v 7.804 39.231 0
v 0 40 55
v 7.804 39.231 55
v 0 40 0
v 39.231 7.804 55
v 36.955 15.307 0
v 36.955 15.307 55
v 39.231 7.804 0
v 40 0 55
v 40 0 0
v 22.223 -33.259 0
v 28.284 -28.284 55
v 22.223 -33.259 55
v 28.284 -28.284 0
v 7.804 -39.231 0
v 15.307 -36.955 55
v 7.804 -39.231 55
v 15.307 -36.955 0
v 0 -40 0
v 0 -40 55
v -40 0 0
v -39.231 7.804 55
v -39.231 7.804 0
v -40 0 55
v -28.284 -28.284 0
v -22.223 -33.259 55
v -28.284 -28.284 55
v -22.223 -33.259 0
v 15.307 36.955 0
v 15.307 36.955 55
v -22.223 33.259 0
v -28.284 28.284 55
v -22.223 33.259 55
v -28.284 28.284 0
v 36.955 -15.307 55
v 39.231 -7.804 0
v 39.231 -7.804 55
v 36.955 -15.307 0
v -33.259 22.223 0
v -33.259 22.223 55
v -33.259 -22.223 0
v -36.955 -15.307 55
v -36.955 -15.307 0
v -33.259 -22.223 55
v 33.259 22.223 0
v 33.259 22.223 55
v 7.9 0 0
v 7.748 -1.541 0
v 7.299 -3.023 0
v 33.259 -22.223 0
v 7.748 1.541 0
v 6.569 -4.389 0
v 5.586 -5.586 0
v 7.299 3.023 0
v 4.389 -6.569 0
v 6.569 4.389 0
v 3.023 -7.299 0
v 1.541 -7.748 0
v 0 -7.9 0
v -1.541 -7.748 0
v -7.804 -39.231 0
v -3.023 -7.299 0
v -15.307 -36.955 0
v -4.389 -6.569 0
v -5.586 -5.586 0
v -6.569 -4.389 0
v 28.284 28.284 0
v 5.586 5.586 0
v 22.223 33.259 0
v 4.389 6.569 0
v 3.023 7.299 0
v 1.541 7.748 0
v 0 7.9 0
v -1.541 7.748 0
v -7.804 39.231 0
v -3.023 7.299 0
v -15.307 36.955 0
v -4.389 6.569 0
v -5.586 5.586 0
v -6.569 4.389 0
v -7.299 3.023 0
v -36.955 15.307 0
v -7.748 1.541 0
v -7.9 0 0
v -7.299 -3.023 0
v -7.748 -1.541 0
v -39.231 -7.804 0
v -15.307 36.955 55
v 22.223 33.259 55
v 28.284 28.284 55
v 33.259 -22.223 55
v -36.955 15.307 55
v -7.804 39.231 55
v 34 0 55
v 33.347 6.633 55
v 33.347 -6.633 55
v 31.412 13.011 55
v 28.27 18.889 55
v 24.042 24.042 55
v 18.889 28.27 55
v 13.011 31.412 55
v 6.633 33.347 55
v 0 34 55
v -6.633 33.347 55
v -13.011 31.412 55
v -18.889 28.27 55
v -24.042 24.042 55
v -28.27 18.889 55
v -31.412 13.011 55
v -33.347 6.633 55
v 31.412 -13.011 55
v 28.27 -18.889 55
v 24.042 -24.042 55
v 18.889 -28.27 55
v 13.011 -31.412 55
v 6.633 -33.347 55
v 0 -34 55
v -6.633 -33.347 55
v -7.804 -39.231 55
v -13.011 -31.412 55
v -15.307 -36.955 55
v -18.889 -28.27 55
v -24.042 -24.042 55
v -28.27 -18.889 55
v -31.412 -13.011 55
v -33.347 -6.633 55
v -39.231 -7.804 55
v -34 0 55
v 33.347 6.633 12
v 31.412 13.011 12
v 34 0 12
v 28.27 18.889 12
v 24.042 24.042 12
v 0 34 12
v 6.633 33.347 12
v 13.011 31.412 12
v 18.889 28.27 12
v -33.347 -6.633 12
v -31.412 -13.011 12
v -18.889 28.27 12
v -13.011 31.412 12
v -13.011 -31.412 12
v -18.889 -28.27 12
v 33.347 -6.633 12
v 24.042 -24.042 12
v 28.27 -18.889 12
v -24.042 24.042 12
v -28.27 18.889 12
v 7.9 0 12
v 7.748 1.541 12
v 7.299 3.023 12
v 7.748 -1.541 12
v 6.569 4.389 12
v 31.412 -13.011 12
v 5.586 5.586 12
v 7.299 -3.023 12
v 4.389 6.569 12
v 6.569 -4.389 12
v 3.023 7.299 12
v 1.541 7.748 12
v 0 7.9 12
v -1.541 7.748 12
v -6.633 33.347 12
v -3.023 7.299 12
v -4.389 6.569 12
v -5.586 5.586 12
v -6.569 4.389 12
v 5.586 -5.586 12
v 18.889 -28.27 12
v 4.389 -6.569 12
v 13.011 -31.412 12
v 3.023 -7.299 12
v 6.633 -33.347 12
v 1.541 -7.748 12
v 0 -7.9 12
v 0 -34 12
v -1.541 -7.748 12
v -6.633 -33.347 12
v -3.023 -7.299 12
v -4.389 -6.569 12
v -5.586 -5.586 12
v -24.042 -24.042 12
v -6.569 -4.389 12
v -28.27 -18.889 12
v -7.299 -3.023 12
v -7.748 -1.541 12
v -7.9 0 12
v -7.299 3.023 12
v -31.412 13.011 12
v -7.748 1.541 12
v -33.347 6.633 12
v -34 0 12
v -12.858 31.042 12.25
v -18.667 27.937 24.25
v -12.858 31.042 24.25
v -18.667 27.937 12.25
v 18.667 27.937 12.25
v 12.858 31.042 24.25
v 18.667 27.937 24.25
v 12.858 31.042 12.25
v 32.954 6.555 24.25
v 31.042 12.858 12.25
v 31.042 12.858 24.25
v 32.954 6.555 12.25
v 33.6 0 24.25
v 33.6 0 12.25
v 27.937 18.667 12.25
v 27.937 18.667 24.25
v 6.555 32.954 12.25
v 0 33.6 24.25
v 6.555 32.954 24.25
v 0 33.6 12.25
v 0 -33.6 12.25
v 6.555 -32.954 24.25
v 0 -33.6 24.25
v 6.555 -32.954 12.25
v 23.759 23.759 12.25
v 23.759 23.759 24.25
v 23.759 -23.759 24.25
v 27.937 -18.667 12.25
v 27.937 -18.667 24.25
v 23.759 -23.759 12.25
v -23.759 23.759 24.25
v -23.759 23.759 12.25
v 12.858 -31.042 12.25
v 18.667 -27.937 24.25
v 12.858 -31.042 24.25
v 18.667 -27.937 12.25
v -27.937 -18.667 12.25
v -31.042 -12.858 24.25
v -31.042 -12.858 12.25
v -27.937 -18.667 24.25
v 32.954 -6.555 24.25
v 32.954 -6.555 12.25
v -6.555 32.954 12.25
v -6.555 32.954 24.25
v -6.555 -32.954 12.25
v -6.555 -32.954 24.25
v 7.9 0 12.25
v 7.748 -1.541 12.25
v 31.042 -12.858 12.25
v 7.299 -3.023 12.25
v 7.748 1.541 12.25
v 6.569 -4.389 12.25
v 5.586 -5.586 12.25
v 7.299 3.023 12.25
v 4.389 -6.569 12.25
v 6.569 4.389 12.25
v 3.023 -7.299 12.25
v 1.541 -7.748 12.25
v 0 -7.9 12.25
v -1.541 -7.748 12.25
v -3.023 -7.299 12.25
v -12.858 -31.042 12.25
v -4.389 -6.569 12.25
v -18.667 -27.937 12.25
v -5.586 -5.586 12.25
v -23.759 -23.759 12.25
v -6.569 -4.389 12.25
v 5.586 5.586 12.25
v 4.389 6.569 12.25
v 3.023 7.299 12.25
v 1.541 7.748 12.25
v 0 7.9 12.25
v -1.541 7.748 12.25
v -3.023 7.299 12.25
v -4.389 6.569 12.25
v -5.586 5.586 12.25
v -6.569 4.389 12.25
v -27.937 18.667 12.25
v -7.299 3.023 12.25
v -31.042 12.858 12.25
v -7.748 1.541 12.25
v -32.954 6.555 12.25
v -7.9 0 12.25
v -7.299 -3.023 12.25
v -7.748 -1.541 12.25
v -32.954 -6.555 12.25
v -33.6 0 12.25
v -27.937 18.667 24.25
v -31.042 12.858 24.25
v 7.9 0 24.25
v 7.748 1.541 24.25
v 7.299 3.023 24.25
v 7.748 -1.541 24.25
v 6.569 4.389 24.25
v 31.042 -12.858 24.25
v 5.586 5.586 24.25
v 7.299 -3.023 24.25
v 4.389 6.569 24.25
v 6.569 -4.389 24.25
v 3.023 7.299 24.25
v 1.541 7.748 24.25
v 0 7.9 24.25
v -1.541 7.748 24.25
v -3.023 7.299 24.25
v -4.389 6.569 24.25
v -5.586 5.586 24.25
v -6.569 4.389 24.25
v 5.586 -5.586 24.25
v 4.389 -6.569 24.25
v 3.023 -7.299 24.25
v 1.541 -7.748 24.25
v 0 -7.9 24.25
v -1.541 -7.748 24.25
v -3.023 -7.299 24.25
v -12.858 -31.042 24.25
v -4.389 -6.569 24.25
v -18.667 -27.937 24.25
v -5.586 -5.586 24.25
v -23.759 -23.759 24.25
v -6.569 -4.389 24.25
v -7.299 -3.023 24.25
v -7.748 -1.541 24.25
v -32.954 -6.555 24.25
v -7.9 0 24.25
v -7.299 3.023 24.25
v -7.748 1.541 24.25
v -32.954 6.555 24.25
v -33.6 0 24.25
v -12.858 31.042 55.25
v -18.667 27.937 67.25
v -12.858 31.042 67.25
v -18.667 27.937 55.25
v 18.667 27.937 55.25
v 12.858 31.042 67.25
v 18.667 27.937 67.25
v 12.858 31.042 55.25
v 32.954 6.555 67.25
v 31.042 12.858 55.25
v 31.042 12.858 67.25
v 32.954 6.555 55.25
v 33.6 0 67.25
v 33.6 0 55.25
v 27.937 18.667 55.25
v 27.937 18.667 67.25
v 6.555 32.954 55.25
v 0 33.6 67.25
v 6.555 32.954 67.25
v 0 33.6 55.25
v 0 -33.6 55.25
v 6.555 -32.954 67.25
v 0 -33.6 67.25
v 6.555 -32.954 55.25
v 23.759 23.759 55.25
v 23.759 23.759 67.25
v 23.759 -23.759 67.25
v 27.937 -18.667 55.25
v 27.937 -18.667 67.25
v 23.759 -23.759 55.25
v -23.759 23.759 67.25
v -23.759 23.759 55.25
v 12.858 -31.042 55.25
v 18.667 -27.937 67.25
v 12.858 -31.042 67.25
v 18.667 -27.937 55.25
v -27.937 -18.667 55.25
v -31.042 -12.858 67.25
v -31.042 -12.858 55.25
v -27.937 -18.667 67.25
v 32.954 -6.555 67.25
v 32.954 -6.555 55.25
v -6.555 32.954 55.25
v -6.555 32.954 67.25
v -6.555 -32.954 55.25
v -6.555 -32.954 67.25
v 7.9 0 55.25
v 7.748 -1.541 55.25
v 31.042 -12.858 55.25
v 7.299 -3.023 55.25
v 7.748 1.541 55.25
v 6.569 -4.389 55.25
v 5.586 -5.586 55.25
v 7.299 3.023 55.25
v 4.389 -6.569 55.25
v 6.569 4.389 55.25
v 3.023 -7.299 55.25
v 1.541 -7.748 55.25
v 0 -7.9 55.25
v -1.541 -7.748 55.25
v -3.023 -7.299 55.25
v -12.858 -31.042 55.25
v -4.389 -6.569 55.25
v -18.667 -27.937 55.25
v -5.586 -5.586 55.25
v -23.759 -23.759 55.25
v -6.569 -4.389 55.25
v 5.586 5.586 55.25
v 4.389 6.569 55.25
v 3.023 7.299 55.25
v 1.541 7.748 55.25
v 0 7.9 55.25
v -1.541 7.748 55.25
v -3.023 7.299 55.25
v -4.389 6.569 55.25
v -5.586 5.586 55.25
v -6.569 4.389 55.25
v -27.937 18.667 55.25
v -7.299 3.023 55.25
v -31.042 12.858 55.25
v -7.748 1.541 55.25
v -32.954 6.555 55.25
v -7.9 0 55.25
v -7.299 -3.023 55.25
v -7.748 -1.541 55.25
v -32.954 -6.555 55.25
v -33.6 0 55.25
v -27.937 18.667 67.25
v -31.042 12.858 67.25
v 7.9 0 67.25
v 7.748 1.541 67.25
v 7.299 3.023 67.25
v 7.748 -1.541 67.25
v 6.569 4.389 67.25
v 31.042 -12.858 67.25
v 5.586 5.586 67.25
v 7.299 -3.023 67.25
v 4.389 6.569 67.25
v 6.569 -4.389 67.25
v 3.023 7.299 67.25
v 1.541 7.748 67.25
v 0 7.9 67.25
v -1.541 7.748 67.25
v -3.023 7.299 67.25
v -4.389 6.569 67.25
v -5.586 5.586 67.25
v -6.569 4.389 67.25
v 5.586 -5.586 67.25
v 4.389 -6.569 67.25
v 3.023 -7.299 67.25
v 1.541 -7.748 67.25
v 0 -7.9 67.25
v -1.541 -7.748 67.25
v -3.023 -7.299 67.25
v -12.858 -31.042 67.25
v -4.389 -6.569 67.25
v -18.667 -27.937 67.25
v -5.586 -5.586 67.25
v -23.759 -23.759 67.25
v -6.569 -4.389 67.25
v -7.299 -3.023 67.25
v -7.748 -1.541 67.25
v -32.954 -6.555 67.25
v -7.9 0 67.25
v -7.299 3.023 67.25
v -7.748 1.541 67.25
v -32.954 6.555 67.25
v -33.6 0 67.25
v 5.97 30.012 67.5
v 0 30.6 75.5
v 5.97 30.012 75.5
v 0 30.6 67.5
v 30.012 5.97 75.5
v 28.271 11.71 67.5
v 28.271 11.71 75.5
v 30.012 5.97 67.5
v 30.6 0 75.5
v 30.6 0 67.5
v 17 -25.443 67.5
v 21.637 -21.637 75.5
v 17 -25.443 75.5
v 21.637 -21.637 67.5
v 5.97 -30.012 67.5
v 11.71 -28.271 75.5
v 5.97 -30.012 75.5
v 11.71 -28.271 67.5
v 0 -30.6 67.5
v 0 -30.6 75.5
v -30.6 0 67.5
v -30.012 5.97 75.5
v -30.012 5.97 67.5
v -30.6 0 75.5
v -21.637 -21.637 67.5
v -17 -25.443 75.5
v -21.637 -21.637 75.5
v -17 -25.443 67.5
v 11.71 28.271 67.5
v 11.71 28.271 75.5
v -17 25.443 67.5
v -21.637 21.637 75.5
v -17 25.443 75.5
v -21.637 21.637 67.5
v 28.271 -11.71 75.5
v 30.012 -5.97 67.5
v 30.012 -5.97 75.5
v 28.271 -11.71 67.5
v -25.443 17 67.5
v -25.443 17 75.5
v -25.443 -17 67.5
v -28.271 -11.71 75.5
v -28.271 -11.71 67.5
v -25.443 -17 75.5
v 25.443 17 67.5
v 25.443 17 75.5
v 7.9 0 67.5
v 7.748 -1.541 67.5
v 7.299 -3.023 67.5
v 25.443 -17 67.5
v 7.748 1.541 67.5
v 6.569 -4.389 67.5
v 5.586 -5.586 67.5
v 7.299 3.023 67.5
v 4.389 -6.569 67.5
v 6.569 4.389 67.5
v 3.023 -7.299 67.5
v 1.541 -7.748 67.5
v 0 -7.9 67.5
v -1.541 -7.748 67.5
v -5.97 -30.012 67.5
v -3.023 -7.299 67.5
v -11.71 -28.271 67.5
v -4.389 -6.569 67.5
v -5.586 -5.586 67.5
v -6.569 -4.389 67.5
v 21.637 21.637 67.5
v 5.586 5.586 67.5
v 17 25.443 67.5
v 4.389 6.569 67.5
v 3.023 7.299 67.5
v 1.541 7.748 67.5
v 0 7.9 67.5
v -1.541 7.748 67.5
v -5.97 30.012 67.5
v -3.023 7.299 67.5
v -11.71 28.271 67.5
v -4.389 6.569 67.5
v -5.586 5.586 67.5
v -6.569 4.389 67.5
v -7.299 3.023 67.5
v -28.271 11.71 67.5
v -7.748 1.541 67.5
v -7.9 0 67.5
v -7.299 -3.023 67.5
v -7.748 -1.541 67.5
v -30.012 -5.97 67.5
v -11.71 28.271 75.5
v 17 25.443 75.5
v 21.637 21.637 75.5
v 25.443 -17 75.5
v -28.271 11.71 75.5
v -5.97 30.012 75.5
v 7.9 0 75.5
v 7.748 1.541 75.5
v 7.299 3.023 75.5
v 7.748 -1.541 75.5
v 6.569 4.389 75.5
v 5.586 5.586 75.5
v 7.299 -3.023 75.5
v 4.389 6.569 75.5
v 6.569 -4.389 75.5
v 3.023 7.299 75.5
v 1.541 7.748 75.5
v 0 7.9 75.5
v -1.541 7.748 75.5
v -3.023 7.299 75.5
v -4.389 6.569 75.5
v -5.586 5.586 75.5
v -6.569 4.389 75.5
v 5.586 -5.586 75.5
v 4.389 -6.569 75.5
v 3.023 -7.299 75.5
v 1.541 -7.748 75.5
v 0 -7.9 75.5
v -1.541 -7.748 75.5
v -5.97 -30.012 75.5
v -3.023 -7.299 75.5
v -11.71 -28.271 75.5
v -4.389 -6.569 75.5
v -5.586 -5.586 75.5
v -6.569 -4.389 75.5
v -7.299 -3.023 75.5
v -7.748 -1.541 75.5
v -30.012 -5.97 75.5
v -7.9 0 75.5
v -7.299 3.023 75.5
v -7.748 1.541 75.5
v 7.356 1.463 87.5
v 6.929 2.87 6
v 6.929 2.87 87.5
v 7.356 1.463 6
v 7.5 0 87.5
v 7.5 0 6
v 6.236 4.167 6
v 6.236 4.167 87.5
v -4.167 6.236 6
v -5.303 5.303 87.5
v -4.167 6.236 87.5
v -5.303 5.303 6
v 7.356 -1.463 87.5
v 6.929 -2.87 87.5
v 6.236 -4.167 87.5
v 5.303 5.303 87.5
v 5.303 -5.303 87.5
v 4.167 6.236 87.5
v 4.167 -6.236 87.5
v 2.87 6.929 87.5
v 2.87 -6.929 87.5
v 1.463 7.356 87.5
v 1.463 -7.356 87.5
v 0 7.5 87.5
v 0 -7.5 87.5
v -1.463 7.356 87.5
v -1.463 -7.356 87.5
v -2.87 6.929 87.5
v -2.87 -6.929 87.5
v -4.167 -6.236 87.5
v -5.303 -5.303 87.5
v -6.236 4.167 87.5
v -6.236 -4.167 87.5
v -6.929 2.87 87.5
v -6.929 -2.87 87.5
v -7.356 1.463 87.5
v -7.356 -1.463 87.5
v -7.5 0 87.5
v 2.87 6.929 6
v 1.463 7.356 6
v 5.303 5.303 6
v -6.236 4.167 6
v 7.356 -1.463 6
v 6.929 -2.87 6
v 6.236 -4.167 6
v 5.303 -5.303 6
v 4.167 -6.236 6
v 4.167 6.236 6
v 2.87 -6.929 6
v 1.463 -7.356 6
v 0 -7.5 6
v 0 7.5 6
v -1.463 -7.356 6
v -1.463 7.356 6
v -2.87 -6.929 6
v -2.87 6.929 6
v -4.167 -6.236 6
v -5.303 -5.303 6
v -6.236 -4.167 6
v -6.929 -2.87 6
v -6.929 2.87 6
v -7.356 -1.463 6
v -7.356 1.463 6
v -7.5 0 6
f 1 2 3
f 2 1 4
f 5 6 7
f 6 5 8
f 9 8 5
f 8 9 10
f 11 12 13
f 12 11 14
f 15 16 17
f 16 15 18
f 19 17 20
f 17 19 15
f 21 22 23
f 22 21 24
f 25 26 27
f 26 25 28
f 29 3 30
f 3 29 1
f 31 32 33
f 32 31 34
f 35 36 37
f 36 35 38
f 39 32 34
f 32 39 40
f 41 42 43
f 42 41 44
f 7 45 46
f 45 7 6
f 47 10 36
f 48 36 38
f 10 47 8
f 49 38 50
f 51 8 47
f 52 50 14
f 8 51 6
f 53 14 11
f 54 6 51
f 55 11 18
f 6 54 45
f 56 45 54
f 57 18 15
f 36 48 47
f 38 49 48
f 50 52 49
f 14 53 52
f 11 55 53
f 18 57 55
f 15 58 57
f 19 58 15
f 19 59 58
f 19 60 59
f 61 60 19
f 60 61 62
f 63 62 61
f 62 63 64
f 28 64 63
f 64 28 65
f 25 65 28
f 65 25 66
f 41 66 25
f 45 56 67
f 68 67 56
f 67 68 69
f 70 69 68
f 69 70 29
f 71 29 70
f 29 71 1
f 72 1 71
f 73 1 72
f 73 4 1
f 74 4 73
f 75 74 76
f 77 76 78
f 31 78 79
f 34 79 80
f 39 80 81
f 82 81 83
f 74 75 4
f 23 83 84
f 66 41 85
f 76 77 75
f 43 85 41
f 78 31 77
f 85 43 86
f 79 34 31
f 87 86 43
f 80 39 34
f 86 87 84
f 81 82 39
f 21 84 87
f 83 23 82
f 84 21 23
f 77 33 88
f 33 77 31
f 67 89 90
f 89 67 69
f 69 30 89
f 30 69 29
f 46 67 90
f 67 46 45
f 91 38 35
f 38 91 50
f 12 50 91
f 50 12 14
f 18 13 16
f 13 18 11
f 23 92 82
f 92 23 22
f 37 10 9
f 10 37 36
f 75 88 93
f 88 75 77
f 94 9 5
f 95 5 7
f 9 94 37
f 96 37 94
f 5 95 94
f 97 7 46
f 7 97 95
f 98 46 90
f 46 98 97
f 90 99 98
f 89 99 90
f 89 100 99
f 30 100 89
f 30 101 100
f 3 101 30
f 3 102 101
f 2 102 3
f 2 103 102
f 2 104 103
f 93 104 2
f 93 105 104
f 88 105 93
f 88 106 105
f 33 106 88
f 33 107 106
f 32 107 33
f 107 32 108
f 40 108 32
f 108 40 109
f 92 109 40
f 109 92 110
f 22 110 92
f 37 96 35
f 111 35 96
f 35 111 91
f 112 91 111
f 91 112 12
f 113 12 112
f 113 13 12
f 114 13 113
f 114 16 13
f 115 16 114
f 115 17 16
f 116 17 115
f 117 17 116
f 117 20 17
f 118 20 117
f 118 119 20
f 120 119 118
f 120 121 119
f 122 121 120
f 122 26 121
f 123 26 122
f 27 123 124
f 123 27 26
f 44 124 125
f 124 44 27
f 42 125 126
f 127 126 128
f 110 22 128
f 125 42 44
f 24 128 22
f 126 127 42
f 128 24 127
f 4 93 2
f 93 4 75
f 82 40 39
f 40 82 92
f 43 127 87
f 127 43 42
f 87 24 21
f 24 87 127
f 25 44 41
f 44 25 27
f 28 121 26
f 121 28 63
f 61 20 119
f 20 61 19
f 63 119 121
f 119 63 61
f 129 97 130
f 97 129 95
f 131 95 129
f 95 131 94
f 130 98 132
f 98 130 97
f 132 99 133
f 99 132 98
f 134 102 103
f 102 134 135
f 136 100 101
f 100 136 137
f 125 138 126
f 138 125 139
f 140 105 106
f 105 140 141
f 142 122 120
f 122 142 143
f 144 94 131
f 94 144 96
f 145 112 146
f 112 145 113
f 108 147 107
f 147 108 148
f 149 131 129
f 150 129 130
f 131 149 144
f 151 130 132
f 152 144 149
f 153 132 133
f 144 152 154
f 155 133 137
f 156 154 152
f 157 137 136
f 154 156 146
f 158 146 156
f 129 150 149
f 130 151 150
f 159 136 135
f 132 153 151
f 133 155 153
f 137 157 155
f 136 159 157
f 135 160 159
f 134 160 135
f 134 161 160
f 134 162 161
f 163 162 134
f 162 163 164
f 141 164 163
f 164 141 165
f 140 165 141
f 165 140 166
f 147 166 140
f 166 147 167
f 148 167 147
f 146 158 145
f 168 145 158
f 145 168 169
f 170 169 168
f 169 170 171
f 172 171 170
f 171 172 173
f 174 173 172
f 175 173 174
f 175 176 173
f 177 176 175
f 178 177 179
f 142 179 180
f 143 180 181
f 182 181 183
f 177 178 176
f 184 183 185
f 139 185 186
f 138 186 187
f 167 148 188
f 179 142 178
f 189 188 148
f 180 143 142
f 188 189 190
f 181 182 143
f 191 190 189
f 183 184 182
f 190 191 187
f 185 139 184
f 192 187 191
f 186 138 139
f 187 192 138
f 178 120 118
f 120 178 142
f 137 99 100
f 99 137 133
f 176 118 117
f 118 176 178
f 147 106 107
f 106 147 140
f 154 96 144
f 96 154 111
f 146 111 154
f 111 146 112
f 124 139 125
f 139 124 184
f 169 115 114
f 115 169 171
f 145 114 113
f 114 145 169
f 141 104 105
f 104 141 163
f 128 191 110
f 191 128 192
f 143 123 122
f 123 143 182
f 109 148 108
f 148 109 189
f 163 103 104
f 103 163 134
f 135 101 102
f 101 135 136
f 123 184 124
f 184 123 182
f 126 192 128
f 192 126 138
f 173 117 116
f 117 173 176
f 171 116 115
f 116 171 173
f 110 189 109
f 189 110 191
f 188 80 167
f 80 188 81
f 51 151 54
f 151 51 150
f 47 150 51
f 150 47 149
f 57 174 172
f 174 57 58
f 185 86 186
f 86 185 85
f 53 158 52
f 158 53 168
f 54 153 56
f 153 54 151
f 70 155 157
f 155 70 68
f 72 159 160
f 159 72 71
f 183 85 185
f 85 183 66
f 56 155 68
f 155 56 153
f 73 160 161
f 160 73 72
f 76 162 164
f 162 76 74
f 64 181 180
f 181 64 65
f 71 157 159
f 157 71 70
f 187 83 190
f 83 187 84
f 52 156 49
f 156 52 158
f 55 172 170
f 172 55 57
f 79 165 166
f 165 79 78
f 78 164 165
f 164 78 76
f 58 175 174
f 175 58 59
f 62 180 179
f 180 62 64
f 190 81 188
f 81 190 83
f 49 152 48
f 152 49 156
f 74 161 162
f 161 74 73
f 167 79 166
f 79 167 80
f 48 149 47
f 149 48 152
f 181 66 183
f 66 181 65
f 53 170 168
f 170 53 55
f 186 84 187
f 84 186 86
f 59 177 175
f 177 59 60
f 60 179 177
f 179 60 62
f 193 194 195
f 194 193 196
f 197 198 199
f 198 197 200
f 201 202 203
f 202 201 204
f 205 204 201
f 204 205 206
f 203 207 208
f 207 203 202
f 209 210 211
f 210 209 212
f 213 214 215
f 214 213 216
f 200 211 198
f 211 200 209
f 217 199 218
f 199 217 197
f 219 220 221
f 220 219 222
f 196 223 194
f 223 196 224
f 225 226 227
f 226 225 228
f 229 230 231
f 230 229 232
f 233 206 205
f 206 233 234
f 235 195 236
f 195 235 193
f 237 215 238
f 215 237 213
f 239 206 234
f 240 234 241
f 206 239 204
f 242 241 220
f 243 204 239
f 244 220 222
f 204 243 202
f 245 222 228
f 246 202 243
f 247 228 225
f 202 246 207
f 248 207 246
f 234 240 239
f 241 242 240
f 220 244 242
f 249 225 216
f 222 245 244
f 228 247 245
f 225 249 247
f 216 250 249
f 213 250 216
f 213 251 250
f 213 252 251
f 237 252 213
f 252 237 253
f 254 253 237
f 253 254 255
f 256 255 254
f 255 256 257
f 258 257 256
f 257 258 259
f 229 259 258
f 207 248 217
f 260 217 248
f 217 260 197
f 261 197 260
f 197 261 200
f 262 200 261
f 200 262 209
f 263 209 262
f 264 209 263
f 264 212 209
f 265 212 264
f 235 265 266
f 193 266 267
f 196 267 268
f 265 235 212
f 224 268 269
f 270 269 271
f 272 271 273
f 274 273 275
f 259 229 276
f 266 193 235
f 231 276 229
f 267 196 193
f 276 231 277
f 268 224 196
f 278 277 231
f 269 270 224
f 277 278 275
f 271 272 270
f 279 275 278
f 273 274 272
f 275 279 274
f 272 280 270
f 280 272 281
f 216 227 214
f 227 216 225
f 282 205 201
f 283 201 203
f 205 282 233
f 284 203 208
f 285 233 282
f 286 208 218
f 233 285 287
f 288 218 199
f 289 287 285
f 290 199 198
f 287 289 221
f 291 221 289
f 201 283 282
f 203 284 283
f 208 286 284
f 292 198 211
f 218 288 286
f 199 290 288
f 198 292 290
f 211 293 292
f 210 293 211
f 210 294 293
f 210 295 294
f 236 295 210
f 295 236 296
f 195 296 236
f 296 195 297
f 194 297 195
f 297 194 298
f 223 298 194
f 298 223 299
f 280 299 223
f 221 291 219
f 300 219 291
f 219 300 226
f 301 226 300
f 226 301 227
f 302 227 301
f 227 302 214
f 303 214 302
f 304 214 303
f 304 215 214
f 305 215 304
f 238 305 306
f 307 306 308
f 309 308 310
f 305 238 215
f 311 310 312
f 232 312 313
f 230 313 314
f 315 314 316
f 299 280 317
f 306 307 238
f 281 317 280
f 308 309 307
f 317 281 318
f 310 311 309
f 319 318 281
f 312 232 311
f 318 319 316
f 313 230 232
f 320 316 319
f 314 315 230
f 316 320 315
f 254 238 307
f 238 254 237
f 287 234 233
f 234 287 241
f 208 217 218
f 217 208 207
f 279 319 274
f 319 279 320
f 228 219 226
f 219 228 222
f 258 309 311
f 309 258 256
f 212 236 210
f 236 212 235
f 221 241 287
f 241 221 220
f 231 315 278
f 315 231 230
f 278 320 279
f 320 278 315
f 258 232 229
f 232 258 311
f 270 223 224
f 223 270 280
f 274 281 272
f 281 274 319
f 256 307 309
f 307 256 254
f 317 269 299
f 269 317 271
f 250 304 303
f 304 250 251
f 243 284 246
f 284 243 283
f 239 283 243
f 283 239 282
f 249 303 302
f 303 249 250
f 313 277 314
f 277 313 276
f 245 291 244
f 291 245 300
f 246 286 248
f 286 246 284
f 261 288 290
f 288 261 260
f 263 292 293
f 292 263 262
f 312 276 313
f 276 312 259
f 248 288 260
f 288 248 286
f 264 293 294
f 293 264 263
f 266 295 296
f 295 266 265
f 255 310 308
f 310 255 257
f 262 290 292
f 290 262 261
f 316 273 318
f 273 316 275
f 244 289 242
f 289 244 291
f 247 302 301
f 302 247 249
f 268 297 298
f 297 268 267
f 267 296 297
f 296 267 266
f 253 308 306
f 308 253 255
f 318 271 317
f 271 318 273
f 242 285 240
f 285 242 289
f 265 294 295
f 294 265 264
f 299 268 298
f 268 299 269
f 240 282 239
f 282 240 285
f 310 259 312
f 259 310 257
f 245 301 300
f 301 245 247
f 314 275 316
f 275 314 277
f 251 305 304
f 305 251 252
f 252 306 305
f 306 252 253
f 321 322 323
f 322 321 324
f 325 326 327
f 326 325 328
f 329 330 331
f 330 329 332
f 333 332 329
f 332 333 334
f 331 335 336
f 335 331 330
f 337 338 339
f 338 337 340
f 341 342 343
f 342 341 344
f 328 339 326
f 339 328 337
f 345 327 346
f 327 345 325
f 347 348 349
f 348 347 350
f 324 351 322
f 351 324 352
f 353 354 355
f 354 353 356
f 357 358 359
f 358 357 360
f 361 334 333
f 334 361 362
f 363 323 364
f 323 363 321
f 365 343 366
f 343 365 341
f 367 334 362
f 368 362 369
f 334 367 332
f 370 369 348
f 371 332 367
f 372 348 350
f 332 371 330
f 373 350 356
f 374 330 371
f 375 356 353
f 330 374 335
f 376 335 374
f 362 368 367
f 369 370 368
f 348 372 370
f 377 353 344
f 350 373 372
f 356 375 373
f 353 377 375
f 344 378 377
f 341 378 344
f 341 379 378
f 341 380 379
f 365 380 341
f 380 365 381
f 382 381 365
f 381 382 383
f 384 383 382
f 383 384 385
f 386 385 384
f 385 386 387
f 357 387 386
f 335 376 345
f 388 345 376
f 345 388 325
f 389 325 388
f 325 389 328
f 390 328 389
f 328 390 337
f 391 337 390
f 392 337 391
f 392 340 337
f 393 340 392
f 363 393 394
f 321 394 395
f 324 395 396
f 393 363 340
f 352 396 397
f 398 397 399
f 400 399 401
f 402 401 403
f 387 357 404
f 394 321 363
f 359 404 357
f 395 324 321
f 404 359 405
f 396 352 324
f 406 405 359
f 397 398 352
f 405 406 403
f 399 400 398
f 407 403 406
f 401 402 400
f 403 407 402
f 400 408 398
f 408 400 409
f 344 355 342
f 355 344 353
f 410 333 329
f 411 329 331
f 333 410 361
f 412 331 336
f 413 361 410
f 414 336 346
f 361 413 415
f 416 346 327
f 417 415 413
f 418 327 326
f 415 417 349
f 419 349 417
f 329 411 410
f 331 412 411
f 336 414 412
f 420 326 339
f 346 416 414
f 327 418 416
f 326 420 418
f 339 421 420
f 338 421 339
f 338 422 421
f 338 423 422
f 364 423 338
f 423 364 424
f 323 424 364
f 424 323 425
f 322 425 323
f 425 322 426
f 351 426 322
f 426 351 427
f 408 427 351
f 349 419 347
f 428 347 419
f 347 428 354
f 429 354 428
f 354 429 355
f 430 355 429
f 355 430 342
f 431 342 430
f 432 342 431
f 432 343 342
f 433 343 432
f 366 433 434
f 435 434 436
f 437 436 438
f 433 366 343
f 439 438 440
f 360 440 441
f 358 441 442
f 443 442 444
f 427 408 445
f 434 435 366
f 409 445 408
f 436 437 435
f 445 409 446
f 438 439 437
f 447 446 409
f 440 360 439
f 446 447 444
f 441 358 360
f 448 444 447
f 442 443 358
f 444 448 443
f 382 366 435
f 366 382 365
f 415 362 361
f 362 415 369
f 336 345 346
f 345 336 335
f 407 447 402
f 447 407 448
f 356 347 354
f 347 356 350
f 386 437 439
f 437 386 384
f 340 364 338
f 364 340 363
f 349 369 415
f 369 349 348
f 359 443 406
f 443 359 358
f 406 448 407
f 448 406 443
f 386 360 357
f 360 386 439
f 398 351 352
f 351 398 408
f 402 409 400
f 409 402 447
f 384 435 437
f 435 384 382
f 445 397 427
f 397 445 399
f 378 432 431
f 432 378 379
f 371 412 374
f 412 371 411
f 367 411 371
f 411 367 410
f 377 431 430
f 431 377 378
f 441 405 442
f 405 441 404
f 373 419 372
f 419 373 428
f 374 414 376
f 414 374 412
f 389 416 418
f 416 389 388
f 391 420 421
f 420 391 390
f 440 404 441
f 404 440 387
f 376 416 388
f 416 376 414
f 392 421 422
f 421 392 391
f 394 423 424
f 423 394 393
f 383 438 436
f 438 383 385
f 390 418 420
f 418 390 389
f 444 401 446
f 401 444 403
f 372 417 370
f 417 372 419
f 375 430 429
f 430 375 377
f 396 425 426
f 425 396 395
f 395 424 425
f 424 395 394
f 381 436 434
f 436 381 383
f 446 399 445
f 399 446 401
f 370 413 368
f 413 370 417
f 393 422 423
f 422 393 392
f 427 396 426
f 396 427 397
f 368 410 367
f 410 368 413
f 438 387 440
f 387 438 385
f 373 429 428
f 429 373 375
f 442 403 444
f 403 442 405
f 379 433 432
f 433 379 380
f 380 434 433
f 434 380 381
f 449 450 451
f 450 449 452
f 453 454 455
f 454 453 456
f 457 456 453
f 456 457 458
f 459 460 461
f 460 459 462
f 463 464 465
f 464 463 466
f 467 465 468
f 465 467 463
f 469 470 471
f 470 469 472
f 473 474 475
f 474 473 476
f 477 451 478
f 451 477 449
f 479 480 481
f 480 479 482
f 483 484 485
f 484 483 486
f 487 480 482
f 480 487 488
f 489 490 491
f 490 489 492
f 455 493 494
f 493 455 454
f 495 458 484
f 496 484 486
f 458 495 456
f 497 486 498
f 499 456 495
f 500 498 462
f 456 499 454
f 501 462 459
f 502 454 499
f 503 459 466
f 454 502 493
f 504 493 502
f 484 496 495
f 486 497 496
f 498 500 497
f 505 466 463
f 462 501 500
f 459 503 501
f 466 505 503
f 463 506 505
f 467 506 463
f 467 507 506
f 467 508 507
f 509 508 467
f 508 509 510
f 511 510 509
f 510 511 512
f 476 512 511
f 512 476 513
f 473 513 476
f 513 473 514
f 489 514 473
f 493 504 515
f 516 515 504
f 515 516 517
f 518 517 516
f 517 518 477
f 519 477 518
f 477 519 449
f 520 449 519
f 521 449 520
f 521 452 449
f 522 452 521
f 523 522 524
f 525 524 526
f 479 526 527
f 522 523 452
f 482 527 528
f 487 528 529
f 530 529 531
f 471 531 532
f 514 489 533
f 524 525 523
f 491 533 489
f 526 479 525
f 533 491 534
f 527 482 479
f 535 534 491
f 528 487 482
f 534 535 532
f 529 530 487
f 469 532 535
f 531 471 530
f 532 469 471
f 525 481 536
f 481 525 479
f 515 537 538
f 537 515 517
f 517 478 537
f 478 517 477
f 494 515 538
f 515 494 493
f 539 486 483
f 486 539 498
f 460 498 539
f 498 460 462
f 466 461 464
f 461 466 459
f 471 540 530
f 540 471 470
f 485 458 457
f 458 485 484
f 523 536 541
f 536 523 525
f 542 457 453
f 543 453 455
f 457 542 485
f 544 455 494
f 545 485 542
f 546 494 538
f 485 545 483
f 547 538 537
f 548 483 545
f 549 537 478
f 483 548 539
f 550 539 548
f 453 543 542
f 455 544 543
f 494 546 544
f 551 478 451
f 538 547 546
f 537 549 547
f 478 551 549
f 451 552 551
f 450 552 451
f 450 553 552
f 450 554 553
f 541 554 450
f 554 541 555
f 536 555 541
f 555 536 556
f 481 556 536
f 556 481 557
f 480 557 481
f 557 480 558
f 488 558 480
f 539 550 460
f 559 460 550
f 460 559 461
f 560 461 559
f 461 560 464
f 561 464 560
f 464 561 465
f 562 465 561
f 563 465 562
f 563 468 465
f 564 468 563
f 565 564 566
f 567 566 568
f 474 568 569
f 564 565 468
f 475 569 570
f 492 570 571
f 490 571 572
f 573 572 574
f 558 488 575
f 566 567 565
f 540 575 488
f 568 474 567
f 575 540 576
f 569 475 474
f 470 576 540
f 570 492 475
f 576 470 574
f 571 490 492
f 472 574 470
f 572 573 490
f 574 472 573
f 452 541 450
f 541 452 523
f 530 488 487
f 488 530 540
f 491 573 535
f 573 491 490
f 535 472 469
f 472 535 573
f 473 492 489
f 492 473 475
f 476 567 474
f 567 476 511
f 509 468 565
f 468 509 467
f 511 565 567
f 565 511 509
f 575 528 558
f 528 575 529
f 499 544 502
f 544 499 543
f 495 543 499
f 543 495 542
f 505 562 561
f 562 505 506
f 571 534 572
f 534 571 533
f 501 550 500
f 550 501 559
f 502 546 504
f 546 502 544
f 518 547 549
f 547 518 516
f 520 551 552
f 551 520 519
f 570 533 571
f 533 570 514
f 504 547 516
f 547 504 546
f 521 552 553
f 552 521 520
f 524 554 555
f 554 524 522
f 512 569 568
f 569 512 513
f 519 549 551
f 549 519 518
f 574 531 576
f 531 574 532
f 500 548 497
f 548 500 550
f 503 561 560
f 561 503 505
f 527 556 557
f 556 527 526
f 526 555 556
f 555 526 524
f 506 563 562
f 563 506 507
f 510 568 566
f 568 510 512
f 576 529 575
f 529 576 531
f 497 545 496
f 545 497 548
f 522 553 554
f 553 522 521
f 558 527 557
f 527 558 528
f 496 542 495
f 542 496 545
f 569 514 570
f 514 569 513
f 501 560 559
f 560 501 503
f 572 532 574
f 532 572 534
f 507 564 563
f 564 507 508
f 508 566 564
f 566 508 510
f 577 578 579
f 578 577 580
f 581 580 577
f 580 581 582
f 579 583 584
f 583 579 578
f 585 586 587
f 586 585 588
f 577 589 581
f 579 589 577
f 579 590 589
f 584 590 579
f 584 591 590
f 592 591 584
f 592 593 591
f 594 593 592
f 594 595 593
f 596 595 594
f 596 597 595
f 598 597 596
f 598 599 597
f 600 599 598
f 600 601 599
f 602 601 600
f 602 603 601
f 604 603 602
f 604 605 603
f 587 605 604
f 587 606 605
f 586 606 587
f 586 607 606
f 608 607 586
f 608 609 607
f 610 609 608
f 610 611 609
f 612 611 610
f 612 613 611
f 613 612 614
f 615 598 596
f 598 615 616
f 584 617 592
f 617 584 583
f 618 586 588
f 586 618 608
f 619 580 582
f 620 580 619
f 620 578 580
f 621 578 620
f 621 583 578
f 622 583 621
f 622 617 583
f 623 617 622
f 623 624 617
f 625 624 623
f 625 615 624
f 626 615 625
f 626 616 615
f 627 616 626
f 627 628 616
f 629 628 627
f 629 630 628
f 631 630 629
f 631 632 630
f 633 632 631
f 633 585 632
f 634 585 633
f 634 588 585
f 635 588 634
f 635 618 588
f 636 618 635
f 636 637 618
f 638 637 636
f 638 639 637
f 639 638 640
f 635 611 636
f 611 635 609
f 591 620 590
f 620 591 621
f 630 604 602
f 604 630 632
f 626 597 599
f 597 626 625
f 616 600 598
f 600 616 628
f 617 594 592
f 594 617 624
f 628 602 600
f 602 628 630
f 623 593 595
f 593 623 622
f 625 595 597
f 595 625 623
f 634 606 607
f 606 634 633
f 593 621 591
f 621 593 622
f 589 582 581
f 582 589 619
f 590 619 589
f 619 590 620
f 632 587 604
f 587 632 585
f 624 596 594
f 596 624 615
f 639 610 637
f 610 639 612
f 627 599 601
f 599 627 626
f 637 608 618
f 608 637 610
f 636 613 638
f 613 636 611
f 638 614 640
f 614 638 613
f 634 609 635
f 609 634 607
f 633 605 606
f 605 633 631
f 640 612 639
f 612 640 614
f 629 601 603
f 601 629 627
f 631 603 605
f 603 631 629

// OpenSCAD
$fn = 32;

// ------------------------------------------------------------------------
// Bearing housing: housing d80, two bearings and a shaft
// Every part is its own module, assembly() places them once.
// ------------------------------------------------------------------------

// --- part 1 ---
module housing() {
  difference() {
    cylinder(h = 55, d = 80);
    translate([0, 0, 12]) cylinder(h = 44, d = 68);
    translate([0, 0, -1]) cylinder(h = 14, d = 15.8);
  }
}

// --- part 2 ---
module bearing_lower() {
  difference() {
      translate([0, 0, 0]) cylinder(h = 12, d = 67.2);
      translate([0, 0, -1]) cylinder(h = 14, d = 15.8);
    }
}

// --- part 3 ---
module bearing_upper() {
  difference() {
      translate([0, 0, 0]) cylinder(h = 12, d = 67.2);
      translate([0, 0, -1]) cylinder(h = 14, d = 15.8);
    }
}

// --- part 4 ---
module spacer() {
  difference() {
      translate([0, 0, 0]) cylinder(h = 8, d = 61.2);
      translate([0, 0, -1]) cylinder(h = 10, d = 15.8);
    }
}

// --- part 5 ---
module shaft() {
  translate([0, 0, -40.75]) cylinder(h = 81.5, d = 15);
}

// --- assembly ---
module assembly() {
  translate([0, 0, 0]) rotate([0, 0, 0]) housing();
  translate([0, 0, 12.25]) rotate([0, 0, 0]) bearing_lower();
  translate([0, 0, 55.25]) rotate([0, 0, 0]) bearing_upper();
  translate([0, 0, 67.5]) rotate([0, 0, 0]) spacer();
  translate([0, 0, 46.75]) rotate([0, 0, 0]) shaft();
}

assembly();
